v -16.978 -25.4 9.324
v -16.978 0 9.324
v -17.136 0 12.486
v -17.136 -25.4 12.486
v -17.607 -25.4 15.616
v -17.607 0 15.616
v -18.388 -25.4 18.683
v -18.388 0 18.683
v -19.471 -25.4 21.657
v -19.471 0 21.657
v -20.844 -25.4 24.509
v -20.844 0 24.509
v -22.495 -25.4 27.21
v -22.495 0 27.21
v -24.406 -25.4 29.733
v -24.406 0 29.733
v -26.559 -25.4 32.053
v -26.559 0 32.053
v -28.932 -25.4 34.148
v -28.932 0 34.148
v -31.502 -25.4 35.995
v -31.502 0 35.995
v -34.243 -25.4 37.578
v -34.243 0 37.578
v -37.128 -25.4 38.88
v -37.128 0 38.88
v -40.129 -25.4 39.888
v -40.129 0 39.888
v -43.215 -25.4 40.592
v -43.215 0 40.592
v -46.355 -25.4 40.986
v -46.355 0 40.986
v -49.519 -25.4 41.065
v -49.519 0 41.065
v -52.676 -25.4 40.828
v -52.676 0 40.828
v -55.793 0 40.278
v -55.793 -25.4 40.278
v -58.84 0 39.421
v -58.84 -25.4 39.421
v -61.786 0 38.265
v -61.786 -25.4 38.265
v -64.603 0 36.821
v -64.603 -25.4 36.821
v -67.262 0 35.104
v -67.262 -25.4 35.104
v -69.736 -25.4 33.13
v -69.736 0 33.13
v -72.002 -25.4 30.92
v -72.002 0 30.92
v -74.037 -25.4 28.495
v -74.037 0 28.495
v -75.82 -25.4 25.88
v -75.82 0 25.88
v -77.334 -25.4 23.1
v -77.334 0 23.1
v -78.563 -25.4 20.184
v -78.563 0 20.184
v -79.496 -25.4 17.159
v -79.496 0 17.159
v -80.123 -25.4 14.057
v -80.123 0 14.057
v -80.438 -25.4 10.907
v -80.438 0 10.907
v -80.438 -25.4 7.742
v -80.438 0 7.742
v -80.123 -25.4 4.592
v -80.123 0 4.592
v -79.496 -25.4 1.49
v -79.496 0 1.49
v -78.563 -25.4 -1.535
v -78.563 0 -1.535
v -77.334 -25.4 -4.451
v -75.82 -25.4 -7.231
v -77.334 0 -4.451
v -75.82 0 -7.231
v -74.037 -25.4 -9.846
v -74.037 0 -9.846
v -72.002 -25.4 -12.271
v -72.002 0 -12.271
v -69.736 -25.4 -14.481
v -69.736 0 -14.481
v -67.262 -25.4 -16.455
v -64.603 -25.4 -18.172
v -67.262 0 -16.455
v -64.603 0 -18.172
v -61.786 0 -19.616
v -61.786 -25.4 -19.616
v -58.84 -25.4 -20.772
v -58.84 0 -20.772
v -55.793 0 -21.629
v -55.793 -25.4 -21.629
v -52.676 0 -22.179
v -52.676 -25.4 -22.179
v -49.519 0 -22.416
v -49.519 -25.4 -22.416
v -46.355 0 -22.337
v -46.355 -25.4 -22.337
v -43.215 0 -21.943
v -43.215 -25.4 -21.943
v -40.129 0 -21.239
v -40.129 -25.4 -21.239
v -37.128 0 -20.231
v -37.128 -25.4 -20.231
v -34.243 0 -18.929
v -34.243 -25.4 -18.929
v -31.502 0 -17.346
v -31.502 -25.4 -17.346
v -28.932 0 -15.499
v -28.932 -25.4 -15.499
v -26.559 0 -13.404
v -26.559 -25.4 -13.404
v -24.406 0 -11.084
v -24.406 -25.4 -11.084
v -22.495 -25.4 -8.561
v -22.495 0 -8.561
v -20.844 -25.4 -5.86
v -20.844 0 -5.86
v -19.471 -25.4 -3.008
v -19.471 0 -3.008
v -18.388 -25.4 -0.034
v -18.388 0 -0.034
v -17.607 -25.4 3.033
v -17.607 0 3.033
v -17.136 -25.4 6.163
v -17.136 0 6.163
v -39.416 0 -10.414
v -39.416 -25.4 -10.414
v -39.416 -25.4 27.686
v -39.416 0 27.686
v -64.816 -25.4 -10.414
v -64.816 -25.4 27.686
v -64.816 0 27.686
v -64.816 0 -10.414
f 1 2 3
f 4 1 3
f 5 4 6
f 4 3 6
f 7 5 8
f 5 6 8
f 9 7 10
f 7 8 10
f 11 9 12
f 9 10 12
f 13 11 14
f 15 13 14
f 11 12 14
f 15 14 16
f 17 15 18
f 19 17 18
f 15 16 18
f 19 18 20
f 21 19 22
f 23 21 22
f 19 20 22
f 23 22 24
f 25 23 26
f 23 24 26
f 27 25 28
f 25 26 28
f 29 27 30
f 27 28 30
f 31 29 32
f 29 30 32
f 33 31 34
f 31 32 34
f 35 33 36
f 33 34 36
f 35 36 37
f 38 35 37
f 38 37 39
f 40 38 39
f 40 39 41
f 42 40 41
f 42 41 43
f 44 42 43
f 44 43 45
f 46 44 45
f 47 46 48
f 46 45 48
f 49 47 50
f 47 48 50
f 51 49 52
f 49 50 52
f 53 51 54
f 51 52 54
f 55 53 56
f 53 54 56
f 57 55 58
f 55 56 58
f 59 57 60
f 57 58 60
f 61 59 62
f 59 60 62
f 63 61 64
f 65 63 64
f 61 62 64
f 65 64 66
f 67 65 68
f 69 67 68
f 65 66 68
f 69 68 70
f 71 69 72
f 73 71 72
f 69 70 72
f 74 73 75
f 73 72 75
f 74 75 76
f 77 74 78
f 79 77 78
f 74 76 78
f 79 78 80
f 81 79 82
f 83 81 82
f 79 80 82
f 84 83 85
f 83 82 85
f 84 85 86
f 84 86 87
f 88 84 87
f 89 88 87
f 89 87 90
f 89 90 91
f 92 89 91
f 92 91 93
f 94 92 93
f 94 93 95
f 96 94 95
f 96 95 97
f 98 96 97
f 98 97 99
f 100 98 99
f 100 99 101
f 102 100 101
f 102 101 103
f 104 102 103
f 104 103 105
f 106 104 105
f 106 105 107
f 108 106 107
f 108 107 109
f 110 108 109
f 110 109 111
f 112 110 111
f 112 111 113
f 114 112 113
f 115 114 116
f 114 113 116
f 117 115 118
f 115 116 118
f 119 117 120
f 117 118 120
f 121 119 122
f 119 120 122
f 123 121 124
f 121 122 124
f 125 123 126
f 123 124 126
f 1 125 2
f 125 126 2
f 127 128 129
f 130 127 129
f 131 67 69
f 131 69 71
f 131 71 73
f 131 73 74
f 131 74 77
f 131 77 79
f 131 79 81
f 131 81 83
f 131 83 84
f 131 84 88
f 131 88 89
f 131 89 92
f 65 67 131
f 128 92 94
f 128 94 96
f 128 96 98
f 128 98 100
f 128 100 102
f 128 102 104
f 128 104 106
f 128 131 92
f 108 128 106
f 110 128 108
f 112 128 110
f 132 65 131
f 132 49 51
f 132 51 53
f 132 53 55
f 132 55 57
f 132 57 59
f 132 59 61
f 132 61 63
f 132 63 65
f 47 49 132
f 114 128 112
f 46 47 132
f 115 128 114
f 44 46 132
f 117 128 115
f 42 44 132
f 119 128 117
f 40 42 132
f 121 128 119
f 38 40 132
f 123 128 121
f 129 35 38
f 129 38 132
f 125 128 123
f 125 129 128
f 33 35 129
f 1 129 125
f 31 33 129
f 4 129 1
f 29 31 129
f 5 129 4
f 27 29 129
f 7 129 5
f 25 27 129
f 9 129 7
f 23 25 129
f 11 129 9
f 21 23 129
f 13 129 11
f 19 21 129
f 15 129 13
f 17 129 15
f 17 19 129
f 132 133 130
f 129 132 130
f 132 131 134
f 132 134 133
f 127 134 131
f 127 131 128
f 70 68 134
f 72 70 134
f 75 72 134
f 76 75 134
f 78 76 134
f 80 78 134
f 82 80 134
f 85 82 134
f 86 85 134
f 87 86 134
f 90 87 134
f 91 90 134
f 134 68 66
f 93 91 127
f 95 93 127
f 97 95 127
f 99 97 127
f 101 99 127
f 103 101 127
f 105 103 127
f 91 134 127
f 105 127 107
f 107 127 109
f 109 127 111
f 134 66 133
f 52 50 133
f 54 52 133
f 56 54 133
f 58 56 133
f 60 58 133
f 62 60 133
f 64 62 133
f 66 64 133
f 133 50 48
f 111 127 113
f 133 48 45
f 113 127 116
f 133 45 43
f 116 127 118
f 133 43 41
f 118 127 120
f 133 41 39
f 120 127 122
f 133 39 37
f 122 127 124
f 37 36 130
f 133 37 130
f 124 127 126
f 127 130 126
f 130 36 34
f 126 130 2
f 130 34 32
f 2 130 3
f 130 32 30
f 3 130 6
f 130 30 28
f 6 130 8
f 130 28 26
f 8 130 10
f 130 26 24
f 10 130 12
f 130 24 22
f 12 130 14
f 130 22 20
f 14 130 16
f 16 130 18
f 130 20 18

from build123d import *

# Parameters (mm, degrees)
F0_R     = 31.75
F1_DEPTH = 25.4
F2_R     = 31.75
F2_W     = 25.4
F2_H     = 38.1
F3_DEPTH = 31.242


with BuildPart() as f1:
    # F0 (on Front) → F1 (new body)
    with BuildSketch(Plane.XZ):
        with Locations((-48.727896, 9.324474)):
            Circle(F0_R)
    extrude(amount=F1_DEPTH)

    # F2 (on face) → F3 (intersect)
    with BuildSketch(Plane.XZ.offset(25.4)):
        with Locations((-48.727896, 9.324474)):
            Circle(F2_R)
        with Locations((-52.116488, 8.636362)):
            Rectangle(F2_W, F2_H, mode=Mode.SUBTRACT)
    extrude(amount=-F3_DEPTH, mode=Mode.INTERSECT)


solid = f1.part
